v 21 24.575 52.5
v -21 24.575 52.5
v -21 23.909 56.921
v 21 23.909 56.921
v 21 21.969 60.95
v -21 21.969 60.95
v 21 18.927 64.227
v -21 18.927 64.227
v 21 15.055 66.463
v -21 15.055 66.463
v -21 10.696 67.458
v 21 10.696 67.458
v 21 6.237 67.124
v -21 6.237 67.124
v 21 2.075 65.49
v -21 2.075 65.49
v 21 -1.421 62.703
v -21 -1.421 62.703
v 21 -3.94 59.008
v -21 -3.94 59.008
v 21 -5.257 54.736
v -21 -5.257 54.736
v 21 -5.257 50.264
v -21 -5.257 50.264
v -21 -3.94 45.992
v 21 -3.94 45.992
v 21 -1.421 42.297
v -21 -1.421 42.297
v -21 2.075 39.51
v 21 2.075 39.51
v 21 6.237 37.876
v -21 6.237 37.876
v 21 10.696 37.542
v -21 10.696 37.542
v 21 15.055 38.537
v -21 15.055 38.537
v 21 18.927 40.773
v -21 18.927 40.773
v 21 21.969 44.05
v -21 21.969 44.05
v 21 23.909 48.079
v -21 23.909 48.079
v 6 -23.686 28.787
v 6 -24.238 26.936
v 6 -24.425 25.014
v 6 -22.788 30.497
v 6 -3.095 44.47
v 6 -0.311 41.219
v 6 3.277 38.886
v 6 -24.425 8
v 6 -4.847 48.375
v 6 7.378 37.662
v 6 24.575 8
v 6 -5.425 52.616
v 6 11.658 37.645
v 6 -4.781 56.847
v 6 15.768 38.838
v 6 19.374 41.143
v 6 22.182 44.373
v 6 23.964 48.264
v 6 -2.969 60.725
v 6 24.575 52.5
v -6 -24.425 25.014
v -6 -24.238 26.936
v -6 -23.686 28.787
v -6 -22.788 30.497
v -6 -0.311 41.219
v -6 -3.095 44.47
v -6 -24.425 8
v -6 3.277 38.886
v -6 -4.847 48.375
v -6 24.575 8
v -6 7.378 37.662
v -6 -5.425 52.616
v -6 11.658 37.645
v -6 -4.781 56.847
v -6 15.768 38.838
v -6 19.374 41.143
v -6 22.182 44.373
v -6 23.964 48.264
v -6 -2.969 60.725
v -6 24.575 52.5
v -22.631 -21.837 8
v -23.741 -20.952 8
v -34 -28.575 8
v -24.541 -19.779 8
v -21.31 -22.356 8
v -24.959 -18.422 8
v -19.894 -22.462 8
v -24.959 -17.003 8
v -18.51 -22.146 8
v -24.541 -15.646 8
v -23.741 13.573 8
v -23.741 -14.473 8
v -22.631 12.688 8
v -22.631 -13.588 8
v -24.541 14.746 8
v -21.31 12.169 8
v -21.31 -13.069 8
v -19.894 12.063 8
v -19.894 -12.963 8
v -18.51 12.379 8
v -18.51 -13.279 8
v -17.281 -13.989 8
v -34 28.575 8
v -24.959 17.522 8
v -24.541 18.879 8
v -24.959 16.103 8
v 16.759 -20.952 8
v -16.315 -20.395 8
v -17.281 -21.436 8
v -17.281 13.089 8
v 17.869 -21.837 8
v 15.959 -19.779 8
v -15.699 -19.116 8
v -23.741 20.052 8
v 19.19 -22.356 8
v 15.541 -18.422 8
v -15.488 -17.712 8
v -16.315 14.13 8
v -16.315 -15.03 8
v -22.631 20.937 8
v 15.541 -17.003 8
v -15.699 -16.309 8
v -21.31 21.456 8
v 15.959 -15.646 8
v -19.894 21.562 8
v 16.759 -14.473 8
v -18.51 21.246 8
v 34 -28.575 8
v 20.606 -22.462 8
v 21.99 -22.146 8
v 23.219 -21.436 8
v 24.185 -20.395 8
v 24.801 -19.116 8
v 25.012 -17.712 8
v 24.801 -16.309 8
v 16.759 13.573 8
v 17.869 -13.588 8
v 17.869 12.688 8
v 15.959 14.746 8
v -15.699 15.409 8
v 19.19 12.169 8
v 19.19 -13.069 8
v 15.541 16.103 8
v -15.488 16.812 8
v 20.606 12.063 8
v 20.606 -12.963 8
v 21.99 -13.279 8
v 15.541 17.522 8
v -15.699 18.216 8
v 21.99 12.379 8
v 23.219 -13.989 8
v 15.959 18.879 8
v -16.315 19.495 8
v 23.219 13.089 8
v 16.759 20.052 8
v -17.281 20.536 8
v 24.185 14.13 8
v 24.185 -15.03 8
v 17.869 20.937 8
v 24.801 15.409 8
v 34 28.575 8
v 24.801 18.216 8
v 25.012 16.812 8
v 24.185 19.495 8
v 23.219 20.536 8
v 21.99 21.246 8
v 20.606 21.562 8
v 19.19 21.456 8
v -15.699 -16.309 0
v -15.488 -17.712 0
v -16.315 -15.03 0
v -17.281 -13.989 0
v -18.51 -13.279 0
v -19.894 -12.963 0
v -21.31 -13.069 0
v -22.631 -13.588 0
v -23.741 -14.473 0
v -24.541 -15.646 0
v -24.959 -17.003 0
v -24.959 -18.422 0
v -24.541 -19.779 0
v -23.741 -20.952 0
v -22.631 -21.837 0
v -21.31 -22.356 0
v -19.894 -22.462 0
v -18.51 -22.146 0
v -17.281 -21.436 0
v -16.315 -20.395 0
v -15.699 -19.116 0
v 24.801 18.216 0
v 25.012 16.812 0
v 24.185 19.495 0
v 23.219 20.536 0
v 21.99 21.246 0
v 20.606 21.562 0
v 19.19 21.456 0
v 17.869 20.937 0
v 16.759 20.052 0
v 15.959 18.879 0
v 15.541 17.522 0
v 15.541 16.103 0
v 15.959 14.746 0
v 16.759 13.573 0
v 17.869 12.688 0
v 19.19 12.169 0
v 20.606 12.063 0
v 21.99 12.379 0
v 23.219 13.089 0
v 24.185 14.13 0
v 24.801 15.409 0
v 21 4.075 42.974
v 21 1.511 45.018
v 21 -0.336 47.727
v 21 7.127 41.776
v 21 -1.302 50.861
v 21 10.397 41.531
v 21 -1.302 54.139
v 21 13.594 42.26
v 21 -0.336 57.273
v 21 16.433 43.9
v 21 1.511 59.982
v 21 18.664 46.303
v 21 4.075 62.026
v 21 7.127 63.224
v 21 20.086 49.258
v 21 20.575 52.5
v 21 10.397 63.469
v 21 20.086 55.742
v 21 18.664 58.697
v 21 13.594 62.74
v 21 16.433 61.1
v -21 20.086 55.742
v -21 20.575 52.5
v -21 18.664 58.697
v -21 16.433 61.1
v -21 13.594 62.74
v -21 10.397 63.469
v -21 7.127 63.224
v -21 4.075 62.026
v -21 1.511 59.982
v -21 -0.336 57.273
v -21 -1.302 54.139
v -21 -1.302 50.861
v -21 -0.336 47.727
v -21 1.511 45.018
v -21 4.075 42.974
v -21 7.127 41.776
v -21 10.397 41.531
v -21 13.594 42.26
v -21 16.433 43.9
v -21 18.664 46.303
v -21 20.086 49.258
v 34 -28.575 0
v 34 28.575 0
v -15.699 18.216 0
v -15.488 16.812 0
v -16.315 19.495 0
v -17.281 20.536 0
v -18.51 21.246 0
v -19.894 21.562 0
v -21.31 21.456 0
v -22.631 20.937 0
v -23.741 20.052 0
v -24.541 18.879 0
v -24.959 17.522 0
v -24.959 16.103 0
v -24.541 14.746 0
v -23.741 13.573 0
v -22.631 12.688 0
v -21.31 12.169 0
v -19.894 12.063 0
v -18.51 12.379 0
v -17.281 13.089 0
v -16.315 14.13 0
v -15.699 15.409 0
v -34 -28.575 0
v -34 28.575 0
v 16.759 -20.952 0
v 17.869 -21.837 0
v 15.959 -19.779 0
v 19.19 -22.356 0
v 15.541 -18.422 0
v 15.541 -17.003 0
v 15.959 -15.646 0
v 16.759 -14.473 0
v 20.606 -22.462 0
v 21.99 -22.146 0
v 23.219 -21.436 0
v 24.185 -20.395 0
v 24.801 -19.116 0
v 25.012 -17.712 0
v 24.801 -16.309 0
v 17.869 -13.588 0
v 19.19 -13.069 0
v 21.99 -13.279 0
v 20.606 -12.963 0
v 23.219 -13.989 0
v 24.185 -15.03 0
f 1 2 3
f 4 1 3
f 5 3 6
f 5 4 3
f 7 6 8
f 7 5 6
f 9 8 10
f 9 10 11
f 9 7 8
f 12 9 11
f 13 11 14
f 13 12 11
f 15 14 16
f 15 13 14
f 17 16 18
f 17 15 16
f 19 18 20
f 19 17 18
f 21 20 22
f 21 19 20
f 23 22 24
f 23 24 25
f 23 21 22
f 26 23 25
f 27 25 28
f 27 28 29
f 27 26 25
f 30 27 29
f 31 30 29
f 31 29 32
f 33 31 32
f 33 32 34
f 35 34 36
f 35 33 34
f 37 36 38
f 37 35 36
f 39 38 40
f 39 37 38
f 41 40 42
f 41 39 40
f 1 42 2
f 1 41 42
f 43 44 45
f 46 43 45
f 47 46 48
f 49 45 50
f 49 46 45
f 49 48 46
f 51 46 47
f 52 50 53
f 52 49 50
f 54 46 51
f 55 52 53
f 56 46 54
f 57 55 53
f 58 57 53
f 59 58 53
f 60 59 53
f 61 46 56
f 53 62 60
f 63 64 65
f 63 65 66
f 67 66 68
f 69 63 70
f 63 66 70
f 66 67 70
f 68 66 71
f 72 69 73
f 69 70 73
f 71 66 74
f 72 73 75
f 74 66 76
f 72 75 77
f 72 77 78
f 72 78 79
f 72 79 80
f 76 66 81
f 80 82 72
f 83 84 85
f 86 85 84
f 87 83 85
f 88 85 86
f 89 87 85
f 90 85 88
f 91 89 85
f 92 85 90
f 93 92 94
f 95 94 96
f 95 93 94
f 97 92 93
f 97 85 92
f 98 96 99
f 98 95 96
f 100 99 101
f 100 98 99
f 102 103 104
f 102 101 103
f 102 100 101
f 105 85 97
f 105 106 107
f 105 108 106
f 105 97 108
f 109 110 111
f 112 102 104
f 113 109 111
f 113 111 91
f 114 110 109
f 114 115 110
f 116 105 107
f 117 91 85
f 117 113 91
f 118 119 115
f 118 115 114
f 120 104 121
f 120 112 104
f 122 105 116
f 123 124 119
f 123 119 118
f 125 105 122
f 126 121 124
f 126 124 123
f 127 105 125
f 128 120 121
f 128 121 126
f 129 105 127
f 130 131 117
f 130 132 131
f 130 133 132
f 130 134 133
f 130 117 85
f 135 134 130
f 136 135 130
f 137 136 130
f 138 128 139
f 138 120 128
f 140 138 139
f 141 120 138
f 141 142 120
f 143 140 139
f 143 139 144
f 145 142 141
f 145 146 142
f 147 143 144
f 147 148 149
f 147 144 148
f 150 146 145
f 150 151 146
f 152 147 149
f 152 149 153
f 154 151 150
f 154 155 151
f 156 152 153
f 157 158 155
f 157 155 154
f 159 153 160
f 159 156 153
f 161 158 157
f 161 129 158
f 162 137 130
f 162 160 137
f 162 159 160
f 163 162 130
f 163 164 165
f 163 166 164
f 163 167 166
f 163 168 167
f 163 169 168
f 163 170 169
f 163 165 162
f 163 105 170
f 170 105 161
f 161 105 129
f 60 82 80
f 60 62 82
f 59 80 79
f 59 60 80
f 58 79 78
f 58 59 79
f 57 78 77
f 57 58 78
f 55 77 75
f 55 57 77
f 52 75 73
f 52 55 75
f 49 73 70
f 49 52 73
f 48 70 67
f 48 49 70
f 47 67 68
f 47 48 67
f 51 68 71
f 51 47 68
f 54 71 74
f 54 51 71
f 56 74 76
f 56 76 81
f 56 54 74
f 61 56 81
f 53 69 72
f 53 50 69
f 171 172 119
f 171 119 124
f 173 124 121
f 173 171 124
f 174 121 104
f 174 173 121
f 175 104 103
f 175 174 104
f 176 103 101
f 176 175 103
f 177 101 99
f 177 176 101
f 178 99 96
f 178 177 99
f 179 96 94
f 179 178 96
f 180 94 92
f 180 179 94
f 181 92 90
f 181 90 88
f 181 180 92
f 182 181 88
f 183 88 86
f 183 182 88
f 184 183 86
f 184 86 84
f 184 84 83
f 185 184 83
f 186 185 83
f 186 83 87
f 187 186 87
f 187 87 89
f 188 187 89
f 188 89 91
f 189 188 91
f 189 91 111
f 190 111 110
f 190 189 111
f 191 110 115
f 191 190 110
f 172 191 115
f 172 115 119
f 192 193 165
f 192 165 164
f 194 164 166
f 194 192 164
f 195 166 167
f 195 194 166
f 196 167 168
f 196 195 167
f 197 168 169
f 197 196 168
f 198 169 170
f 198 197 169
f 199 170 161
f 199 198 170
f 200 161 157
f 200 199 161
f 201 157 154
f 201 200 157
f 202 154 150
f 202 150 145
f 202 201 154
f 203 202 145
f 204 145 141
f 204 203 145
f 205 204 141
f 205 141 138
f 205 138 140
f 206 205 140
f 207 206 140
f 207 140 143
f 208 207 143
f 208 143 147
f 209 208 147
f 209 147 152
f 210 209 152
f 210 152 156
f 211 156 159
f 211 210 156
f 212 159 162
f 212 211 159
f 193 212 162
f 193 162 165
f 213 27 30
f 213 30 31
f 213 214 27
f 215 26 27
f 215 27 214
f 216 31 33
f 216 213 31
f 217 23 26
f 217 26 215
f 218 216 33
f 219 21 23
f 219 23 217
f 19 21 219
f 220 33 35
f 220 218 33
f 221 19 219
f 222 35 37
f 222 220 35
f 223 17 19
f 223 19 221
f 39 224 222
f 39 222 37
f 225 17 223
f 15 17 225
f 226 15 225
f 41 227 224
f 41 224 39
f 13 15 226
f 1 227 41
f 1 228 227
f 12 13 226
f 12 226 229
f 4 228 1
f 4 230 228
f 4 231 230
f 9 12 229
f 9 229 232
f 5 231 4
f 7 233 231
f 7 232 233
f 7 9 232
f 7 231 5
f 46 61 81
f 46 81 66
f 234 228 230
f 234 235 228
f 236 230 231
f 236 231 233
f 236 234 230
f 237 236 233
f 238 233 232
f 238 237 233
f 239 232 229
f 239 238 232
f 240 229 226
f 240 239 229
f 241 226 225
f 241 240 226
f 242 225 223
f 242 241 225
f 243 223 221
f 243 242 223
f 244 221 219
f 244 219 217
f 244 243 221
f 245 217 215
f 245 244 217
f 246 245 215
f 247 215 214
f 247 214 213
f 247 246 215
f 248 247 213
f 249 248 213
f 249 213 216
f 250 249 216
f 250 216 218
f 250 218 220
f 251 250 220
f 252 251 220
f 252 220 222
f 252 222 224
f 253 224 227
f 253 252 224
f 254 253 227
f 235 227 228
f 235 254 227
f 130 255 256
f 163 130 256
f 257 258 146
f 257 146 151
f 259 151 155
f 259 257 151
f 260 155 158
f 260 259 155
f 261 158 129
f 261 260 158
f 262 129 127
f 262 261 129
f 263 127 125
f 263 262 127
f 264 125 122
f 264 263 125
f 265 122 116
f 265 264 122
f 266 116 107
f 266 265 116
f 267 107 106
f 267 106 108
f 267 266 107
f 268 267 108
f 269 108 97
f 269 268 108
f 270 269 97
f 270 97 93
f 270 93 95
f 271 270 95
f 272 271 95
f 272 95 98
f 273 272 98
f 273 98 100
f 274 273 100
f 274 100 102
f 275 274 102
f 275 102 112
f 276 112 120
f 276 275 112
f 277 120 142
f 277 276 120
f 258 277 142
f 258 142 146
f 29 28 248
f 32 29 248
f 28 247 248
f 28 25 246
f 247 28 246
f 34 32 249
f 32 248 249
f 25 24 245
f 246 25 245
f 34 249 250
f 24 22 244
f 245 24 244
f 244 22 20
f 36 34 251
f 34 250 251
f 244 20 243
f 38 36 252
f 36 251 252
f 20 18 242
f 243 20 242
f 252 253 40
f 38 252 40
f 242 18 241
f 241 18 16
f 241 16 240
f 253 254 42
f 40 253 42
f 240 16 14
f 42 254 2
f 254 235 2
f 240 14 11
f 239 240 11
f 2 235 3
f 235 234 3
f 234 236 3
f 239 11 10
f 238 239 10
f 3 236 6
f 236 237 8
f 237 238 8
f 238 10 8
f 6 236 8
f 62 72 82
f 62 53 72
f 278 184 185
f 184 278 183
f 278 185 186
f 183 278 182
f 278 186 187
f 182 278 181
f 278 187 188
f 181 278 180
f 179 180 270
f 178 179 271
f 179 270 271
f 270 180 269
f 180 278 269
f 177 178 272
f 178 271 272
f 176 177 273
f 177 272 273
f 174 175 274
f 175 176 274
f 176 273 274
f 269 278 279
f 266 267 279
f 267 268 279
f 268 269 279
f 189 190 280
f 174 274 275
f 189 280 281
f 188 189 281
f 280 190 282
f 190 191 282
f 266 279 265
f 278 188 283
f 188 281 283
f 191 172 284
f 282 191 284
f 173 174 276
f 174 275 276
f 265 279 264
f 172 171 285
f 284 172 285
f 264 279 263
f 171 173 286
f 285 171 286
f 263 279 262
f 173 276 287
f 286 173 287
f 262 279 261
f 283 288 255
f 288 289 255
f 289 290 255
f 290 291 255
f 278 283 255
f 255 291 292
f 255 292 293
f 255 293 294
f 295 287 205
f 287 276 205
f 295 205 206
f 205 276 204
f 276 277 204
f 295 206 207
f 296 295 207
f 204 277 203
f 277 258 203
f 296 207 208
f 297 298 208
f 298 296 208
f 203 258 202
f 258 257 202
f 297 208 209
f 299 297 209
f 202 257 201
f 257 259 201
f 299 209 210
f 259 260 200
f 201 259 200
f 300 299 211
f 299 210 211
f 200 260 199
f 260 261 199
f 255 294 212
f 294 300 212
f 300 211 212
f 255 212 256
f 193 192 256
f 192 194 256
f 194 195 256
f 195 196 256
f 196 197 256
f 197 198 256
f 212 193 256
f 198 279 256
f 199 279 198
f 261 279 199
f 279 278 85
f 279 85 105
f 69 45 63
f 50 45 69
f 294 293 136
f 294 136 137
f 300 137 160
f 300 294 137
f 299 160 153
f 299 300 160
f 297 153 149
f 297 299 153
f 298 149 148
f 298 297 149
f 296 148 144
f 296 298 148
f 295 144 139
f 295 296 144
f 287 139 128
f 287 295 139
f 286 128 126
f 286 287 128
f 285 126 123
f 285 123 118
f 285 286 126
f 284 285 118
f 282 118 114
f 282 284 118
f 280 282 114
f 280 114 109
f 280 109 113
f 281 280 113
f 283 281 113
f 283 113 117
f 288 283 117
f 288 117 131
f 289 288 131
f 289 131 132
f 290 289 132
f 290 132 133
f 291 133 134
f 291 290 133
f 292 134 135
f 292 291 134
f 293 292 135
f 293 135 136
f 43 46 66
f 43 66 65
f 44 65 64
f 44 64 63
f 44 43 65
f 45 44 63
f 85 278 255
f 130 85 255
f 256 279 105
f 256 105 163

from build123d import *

# Parameters (mm, degrees)
F0_W     = 68
F0_H     = 57.15
F0_R     = 4.7625
F1_DEPTH = 8
F2_R     = 15
F2_R_2   = 11
F3_DEPTH = 21
F5_DEPTH = 6


with BuildPart() as f1:
    # F0 (on Top) → F1 (new body)
    with BuildSketch(Plane.XY):
        Rectangle(F0_W, F0_H)
        with Locations((-20.25, -17.7125)):
            Circle(F0_R, mode=Mode.SUBTRACT)
        with Locations((20.25, -17.7125)):
            Circle(F0_R, mode=Mode.SUBTRACT)
        with Locations((-20.25, 16.8125)):
            Circle(F0_R, mode=Mode.SUBTRACT)
        with Locations((20.25, 16.8125)):
            Circle(F0_R, mode=Mode.SUBTRACT)
    extrude(amount=F1_DEPTH)


with BuildPart() as f3:
    # F2 (on Right) → F3 (new body, symmetric)
    with BuildSketch(Plane.YZ):
        with Locations((9.575, 52.5)):
            Circle(F2_R)
        with Locations((9.575, 52.5)):
            Circle(F2_R_2, mode=Mode.SUBTRACT)
    extrude(amount=F3_DEPTH, both=True)


with BuildPart() as f5:
    # F4 (on Right) → F5 (new body, symmetric)
    with BuildSketch(Plane.YZ):
        with BuildLine():
            ThreePointArc((24.575, 52.5), (5.283303, 38.127062), (-2.969178, 60.724573))
            Line((-2.969178, 60.724573), (-22.787785, 30.497092))
            ThreePointArc((-22.787785, 30.497092), (-24.006958, 27.875175), (-24.425, 25.014043))
            Line((-24.425, 25.014043), (-24.425, 8))
            Line((-24.425, 8), (24.575, 8))
            Line((24.575, 8), (24.575, 52.5))
        make_face()
    extrude(amount=F5_DEPTH, both=True)


solid = Compound([f1.part, f3.part, f5.part])
